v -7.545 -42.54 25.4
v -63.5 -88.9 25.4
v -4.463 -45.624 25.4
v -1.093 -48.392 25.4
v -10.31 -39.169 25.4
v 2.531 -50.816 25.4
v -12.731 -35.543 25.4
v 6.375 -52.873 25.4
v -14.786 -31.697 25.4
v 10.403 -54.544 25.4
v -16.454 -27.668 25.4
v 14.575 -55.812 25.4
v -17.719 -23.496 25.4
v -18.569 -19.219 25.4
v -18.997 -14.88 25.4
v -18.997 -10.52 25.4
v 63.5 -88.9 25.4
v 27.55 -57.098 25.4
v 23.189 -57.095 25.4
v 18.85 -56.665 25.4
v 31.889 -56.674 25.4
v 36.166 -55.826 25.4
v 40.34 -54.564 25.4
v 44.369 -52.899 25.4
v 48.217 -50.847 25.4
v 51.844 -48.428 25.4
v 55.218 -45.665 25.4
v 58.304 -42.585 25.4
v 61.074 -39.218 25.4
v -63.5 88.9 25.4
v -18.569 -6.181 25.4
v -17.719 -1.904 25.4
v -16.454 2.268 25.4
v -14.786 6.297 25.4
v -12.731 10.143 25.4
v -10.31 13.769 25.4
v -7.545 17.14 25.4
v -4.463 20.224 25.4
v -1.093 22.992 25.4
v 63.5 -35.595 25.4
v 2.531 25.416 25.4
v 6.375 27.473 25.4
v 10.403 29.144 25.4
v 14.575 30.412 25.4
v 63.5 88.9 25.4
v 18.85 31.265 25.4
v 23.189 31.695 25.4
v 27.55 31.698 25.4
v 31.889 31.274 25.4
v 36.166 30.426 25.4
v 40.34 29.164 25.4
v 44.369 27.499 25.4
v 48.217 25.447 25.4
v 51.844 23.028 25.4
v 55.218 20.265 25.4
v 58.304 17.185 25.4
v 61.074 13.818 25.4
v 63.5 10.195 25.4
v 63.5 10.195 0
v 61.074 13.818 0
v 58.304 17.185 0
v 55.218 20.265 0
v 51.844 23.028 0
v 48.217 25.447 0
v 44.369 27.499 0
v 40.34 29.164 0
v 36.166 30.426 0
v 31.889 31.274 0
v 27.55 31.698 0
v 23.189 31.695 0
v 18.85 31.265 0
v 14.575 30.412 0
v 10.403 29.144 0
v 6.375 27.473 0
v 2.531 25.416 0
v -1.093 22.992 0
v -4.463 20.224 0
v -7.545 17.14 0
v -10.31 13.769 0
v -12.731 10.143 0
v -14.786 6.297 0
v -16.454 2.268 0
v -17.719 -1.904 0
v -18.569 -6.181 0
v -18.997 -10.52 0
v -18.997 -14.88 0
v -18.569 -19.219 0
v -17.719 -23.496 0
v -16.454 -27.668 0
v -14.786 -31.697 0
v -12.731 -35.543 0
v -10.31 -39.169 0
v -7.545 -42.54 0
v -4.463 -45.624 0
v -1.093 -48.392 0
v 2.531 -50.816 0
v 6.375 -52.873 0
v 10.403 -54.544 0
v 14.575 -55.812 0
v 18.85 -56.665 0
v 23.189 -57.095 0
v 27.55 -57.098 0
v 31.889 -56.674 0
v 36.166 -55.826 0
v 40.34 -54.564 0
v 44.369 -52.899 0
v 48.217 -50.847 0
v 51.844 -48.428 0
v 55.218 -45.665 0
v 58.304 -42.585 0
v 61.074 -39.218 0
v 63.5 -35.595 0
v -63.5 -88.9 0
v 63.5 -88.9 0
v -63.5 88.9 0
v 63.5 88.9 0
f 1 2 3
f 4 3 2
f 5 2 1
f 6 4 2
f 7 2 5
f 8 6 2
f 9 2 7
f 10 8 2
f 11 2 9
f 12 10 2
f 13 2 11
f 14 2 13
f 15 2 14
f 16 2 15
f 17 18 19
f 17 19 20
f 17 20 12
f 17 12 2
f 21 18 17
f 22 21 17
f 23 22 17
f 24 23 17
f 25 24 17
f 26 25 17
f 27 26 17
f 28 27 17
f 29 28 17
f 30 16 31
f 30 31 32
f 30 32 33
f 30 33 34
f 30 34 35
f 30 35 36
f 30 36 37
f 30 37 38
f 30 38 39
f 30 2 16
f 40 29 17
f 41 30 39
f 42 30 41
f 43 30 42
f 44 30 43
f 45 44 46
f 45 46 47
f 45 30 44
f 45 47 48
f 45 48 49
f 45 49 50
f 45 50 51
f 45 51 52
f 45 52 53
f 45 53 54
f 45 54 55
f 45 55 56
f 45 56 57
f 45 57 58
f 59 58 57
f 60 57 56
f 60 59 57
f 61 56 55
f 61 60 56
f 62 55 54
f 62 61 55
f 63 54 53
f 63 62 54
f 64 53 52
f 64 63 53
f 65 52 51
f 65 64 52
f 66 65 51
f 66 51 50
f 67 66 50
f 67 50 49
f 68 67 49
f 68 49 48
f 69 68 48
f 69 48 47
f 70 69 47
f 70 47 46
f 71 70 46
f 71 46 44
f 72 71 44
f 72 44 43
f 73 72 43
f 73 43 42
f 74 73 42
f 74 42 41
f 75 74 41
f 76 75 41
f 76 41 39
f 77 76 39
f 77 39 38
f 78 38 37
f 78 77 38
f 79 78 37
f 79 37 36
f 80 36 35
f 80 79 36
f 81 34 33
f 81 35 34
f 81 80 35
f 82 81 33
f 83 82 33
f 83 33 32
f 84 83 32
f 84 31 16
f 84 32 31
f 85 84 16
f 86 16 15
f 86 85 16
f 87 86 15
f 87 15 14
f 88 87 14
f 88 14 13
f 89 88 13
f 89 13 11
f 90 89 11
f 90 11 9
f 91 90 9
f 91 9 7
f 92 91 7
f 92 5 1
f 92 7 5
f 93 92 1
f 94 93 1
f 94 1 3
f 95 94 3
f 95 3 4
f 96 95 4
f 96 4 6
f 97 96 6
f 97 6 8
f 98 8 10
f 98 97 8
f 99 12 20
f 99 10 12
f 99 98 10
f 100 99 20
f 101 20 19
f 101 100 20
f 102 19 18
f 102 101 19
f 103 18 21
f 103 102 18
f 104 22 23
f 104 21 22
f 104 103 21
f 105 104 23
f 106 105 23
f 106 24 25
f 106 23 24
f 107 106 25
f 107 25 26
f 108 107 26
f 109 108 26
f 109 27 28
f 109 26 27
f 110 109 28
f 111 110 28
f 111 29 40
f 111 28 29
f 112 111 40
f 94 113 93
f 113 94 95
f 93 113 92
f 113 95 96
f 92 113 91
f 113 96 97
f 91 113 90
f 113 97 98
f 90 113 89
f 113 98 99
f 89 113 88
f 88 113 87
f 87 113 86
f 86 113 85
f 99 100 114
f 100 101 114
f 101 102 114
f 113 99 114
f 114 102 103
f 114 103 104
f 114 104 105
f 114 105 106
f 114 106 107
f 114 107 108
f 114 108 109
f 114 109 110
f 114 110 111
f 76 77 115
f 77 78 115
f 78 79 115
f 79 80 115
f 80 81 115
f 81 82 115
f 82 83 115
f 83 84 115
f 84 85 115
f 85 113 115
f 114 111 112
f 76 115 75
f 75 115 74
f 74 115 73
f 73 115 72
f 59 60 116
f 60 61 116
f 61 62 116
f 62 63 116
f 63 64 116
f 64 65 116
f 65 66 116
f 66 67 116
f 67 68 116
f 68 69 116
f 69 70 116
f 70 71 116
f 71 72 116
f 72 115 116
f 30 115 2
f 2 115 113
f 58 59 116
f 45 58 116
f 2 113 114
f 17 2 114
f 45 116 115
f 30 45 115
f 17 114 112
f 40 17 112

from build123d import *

# Parameters (mm, degrees)
F2_DEPTH = 25.4
F3_DEPTH = 25.401


with BuildPart() as f2:
    # F1 (on Top) → F2 (new body)
    with BuildSketch(Plane.XY):
        with BuildLine():
            Line((63.5, 88.9), (-63.5, 88.9))
            Line((-63.5, 88.9), (-63.5, -88.9))
            Line((-63.5, -88.9), (63.5, -88.9))
            Line((63.5, -88.9), (63.5, -35.5952505992))
            ThreePointArc((63.5, -35.5952505992), (-19.05, -12.7), (63.5, 10.1952505992))
            Line((63.5, 10.1952505992), (63.5, 88.9))
        make_face()
        with BuildLine():
            Line((63.5, -35.5952505992), (63.5, 10.1952505992))
            ThreePointArc((63.5, 10.1952505992), (-19.05, -12.7), (63.5, -35.5952505992))
        make_face()
    extrude(amount=F2_DEPTH)

    # F1 (on Top) → F3 (cut, through all)
    with BuildSketch(Plane.XY):
        with BuildLine():
            Line((63.5, -35.5952505992), (63.5, 10.1952505992))
            ThreePointArc((63.5, 10.1952505992), (-19.05, -12.7), (63.5, -35.5952505992))
        make_face()
    extrude(amount=F3_DEPTH, mode=Mode.SUBTRACT)


solid = f2.part
